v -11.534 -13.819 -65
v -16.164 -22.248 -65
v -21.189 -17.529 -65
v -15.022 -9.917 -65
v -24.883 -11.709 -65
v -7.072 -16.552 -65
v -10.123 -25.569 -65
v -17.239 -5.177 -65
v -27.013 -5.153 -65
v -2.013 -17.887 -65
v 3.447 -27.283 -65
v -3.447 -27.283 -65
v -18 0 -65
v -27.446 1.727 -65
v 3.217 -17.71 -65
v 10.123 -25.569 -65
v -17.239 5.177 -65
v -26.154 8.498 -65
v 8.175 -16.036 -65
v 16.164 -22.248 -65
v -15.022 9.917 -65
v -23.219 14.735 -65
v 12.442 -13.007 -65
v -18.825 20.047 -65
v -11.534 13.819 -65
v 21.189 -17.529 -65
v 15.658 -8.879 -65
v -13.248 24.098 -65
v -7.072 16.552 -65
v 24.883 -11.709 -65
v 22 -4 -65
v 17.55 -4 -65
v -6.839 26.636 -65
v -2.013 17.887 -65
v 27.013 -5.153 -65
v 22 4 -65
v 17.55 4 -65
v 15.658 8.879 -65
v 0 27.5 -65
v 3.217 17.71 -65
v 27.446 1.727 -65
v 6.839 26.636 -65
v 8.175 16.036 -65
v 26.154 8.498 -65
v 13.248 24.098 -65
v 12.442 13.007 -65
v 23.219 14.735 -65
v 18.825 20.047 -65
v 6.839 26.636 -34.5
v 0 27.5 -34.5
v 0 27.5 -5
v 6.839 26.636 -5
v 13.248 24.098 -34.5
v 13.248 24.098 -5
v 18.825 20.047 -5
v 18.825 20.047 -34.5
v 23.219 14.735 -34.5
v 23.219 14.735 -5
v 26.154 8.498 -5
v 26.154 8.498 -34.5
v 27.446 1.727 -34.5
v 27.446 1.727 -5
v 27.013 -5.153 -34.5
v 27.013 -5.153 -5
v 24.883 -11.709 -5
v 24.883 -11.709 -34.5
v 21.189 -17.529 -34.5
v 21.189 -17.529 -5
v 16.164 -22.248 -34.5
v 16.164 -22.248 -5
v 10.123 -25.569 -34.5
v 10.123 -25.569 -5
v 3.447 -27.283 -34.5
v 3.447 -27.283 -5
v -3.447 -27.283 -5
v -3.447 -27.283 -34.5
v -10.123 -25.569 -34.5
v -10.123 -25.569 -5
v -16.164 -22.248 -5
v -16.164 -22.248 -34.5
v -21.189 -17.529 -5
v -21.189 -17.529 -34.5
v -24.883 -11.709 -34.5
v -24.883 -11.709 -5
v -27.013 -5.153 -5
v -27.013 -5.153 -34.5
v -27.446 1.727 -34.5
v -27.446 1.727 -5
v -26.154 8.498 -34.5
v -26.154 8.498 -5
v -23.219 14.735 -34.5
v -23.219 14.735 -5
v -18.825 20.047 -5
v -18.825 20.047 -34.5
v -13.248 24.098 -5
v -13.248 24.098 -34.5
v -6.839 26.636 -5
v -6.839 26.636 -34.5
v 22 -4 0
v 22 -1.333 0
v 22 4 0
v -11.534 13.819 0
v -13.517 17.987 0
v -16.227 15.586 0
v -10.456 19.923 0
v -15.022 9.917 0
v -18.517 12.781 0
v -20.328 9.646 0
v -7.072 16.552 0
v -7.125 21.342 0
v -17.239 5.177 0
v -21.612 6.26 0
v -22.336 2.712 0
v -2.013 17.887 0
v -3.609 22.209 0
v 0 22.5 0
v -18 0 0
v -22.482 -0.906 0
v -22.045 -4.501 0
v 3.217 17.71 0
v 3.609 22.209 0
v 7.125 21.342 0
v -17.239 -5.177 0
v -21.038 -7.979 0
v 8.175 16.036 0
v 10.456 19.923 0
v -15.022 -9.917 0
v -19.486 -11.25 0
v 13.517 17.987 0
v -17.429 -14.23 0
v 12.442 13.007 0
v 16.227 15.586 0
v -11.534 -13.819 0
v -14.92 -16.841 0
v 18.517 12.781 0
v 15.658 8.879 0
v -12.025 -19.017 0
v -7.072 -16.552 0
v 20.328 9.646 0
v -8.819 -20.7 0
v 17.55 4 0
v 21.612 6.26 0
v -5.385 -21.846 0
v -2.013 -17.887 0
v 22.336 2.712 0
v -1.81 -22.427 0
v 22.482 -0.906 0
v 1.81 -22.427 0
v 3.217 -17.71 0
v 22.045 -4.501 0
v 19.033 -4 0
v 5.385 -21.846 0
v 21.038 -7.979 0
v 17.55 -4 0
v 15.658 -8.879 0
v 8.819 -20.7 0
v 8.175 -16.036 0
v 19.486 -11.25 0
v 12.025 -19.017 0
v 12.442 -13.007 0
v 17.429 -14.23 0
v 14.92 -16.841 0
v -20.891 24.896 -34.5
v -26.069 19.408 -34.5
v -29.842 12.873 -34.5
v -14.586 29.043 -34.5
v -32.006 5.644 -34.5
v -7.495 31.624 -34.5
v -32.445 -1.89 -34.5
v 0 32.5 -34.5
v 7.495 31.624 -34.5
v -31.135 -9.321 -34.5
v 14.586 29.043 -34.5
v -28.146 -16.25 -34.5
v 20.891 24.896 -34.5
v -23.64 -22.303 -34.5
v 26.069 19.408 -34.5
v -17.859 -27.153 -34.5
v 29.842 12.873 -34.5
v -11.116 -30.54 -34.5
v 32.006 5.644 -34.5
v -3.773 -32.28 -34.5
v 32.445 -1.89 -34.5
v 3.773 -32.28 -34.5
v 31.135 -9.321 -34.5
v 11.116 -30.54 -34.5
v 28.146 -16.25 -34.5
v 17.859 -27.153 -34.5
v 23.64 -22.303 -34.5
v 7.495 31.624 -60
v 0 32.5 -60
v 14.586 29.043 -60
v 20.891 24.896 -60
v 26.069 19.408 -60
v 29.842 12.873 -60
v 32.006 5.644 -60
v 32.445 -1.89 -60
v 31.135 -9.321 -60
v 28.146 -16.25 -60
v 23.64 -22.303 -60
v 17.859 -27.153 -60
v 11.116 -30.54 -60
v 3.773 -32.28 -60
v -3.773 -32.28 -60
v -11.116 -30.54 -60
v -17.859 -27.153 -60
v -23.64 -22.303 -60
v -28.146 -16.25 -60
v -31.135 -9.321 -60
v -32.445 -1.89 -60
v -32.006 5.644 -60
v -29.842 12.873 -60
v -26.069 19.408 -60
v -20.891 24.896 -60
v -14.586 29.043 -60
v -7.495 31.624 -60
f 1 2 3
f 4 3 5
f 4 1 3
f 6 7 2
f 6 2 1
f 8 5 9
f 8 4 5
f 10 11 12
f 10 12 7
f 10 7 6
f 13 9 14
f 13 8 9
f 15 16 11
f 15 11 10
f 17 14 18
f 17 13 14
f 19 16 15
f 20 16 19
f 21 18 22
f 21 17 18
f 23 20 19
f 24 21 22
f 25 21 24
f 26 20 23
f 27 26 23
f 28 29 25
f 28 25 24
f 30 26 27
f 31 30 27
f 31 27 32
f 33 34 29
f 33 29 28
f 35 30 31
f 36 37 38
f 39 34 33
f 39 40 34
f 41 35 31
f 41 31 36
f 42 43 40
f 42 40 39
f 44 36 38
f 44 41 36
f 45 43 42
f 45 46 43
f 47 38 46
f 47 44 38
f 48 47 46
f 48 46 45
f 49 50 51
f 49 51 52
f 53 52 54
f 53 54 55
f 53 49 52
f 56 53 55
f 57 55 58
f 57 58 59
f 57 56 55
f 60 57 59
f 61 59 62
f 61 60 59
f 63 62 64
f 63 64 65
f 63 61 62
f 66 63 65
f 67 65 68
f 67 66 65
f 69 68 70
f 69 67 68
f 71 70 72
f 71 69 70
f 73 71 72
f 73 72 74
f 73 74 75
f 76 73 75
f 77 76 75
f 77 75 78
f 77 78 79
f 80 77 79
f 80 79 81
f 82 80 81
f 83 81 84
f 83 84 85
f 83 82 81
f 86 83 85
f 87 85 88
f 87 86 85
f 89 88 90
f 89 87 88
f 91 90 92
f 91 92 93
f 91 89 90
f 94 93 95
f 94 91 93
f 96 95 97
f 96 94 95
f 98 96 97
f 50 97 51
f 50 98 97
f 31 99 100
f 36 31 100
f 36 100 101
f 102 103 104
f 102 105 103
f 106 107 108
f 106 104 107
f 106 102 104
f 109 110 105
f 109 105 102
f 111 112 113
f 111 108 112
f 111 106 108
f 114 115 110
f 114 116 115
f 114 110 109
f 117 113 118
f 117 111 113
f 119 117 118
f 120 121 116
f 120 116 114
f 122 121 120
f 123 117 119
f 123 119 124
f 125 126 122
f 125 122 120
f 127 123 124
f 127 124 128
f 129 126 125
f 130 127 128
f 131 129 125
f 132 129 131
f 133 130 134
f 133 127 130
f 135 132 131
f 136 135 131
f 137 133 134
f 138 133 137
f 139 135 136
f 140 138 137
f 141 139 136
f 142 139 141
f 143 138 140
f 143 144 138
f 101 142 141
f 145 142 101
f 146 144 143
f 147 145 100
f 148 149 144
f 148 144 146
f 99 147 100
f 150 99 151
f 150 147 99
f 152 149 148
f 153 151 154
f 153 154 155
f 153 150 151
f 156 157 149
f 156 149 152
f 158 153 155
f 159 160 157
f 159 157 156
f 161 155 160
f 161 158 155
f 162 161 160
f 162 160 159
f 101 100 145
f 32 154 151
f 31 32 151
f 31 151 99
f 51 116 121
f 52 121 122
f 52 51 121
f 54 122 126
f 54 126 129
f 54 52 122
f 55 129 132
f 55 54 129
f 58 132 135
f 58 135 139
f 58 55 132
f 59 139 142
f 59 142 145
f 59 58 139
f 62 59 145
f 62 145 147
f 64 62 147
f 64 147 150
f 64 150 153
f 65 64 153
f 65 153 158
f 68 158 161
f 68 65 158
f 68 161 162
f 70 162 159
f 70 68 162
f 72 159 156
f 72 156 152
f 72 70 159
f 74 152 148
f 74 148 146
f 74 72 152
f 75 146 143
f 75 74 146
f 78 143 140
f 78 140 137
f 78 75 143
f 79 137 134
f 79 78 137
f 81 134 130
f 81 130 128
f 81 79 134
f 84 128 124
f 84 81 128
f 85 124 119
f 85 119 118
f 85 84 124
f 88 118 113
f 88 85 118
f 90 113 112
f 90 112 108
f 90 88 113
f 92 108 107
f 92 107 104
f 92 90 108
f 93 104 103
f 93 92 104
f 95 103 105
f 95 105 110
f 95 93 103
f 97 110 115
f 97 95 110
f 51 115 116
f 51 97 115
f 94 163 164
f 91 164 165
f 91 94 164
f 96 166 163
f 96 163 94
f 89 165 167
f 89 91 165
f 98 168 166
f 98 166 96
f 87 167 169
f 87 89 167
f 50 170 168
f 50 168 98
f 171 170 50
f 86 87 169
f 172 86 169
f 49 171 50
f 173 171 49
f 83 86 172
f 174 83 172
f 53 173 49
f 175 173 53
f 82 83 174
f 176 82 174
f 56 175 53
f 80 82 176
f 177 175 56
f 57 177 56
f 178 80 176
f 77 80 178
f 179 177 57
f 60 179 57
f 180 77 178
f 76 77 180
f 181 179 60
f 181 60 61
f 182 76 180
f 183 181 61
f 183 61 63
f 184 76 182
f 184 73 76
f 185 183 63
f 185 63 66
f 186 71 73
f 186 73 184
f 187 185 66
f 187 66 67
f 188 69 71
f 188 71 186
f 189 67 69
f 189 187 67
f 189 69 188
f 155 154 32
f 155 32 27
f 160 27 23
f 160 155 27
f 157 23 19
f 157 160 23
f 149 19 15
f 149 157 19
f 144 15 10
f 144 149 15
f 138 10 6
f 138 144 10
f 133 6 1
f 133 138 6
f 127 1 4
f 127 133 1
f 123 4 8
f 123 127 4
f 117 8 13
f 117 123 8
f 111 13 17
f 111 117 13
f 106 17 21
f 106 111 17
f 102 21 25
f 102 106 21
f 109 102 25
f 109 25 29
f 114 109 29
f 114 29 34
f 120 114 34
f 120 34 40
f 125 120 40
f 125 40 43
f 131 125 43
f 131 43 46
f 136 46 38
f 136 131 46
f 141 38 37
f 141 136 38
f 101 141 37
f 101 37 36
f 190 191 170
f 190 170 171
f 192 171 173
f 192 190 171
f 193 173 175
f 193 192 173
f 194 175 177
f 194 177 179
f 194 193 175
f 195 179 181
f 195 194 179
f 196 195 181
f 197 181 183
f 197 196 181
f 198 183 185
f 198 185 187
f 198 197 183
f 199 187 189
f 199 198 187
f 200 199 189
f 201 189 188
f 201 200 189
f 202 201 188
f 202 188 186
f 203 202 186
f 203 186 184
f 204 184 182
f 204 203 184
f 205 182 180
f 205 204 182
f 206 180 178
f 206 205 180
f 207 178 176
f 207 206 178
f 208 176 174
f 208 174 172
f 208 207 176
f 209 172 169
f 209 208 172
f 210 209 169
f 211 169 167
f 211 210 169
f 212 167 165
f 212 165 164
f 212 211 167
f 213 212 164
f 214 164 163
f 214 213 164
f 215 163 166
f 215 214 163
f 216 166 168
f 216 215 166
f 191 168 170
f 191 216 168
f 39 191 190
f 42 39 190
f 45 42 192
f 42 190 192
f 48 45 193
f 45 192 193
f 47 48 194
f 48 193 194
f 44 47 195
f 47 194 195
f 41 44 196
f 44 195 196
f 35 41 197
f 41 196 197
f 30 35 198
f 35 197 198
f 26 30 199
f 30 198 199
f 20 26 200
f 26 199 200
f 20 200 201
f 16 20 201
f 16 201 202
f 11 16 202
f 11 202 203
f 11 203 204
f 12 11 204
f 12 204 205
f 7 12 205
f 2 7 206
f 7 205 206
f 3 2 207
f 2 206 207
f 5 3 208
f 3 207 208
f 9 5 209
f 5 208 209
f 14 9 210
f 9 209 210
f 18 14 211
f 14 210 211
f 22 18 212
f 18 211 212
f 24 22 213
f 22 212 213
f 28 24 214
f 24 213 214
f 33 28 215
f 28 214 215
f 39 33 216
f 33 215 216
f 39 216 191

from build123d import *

# Parameters (mm, degrees)
ZKOSEN_1_SIZE            = 5
ZKOSEN_2_SIZE            = 5
SKICA3_W                 = 8
SKICA3_H                 = 8
ODEBRAT_VYSUNUT_M1_DEPTH = 66


with BuildPart() as part:
    # Skica1 → Rotovat1 (revolve)
    with BuildSketch(Plane(origin=(0, 0, 0), x_dir=(0, 0, -1), z_dir=(1, 0, 0))):
        Polygon((0, 18), (0, 27.5), (34.5, 27.5), (34.5, 32.5), (65, 32.5), (65, 18), align=None)
    revolve(axis=Axis((0, 0, 25.517724518), (0, 0, -1)))

    # Zkosení1
    zkosen_1_edges = [part.edges().sort_by_distance(p)[0] for p in [
        (0, -27.5, 0),
    ]]
    chamfer(zkosen_1_edges, length=ZKOSEN_1_SIZE)

    # Zkosení2
    zkosen_2_edges = [part.edges().sort_by_distance(p)[0] for p in [
        (0, -32.5, -65),
    ]]
    chamfer(zkosen_2_edges, length=ZKOSEN_2_SIZE)

    # Skica3 → Odebrat vysunutím1 (cut, through all)
    with BuildSketch(Plane.XY):
        with Locations((18, 0)):
            Rectangle(SKICA3_W, SKICA3_H)
    extrude(amount=-ODEBRAT_VYSUNUT_M1_DEPTH, mode=Mode.SUBTRACT)


solid = part.part
